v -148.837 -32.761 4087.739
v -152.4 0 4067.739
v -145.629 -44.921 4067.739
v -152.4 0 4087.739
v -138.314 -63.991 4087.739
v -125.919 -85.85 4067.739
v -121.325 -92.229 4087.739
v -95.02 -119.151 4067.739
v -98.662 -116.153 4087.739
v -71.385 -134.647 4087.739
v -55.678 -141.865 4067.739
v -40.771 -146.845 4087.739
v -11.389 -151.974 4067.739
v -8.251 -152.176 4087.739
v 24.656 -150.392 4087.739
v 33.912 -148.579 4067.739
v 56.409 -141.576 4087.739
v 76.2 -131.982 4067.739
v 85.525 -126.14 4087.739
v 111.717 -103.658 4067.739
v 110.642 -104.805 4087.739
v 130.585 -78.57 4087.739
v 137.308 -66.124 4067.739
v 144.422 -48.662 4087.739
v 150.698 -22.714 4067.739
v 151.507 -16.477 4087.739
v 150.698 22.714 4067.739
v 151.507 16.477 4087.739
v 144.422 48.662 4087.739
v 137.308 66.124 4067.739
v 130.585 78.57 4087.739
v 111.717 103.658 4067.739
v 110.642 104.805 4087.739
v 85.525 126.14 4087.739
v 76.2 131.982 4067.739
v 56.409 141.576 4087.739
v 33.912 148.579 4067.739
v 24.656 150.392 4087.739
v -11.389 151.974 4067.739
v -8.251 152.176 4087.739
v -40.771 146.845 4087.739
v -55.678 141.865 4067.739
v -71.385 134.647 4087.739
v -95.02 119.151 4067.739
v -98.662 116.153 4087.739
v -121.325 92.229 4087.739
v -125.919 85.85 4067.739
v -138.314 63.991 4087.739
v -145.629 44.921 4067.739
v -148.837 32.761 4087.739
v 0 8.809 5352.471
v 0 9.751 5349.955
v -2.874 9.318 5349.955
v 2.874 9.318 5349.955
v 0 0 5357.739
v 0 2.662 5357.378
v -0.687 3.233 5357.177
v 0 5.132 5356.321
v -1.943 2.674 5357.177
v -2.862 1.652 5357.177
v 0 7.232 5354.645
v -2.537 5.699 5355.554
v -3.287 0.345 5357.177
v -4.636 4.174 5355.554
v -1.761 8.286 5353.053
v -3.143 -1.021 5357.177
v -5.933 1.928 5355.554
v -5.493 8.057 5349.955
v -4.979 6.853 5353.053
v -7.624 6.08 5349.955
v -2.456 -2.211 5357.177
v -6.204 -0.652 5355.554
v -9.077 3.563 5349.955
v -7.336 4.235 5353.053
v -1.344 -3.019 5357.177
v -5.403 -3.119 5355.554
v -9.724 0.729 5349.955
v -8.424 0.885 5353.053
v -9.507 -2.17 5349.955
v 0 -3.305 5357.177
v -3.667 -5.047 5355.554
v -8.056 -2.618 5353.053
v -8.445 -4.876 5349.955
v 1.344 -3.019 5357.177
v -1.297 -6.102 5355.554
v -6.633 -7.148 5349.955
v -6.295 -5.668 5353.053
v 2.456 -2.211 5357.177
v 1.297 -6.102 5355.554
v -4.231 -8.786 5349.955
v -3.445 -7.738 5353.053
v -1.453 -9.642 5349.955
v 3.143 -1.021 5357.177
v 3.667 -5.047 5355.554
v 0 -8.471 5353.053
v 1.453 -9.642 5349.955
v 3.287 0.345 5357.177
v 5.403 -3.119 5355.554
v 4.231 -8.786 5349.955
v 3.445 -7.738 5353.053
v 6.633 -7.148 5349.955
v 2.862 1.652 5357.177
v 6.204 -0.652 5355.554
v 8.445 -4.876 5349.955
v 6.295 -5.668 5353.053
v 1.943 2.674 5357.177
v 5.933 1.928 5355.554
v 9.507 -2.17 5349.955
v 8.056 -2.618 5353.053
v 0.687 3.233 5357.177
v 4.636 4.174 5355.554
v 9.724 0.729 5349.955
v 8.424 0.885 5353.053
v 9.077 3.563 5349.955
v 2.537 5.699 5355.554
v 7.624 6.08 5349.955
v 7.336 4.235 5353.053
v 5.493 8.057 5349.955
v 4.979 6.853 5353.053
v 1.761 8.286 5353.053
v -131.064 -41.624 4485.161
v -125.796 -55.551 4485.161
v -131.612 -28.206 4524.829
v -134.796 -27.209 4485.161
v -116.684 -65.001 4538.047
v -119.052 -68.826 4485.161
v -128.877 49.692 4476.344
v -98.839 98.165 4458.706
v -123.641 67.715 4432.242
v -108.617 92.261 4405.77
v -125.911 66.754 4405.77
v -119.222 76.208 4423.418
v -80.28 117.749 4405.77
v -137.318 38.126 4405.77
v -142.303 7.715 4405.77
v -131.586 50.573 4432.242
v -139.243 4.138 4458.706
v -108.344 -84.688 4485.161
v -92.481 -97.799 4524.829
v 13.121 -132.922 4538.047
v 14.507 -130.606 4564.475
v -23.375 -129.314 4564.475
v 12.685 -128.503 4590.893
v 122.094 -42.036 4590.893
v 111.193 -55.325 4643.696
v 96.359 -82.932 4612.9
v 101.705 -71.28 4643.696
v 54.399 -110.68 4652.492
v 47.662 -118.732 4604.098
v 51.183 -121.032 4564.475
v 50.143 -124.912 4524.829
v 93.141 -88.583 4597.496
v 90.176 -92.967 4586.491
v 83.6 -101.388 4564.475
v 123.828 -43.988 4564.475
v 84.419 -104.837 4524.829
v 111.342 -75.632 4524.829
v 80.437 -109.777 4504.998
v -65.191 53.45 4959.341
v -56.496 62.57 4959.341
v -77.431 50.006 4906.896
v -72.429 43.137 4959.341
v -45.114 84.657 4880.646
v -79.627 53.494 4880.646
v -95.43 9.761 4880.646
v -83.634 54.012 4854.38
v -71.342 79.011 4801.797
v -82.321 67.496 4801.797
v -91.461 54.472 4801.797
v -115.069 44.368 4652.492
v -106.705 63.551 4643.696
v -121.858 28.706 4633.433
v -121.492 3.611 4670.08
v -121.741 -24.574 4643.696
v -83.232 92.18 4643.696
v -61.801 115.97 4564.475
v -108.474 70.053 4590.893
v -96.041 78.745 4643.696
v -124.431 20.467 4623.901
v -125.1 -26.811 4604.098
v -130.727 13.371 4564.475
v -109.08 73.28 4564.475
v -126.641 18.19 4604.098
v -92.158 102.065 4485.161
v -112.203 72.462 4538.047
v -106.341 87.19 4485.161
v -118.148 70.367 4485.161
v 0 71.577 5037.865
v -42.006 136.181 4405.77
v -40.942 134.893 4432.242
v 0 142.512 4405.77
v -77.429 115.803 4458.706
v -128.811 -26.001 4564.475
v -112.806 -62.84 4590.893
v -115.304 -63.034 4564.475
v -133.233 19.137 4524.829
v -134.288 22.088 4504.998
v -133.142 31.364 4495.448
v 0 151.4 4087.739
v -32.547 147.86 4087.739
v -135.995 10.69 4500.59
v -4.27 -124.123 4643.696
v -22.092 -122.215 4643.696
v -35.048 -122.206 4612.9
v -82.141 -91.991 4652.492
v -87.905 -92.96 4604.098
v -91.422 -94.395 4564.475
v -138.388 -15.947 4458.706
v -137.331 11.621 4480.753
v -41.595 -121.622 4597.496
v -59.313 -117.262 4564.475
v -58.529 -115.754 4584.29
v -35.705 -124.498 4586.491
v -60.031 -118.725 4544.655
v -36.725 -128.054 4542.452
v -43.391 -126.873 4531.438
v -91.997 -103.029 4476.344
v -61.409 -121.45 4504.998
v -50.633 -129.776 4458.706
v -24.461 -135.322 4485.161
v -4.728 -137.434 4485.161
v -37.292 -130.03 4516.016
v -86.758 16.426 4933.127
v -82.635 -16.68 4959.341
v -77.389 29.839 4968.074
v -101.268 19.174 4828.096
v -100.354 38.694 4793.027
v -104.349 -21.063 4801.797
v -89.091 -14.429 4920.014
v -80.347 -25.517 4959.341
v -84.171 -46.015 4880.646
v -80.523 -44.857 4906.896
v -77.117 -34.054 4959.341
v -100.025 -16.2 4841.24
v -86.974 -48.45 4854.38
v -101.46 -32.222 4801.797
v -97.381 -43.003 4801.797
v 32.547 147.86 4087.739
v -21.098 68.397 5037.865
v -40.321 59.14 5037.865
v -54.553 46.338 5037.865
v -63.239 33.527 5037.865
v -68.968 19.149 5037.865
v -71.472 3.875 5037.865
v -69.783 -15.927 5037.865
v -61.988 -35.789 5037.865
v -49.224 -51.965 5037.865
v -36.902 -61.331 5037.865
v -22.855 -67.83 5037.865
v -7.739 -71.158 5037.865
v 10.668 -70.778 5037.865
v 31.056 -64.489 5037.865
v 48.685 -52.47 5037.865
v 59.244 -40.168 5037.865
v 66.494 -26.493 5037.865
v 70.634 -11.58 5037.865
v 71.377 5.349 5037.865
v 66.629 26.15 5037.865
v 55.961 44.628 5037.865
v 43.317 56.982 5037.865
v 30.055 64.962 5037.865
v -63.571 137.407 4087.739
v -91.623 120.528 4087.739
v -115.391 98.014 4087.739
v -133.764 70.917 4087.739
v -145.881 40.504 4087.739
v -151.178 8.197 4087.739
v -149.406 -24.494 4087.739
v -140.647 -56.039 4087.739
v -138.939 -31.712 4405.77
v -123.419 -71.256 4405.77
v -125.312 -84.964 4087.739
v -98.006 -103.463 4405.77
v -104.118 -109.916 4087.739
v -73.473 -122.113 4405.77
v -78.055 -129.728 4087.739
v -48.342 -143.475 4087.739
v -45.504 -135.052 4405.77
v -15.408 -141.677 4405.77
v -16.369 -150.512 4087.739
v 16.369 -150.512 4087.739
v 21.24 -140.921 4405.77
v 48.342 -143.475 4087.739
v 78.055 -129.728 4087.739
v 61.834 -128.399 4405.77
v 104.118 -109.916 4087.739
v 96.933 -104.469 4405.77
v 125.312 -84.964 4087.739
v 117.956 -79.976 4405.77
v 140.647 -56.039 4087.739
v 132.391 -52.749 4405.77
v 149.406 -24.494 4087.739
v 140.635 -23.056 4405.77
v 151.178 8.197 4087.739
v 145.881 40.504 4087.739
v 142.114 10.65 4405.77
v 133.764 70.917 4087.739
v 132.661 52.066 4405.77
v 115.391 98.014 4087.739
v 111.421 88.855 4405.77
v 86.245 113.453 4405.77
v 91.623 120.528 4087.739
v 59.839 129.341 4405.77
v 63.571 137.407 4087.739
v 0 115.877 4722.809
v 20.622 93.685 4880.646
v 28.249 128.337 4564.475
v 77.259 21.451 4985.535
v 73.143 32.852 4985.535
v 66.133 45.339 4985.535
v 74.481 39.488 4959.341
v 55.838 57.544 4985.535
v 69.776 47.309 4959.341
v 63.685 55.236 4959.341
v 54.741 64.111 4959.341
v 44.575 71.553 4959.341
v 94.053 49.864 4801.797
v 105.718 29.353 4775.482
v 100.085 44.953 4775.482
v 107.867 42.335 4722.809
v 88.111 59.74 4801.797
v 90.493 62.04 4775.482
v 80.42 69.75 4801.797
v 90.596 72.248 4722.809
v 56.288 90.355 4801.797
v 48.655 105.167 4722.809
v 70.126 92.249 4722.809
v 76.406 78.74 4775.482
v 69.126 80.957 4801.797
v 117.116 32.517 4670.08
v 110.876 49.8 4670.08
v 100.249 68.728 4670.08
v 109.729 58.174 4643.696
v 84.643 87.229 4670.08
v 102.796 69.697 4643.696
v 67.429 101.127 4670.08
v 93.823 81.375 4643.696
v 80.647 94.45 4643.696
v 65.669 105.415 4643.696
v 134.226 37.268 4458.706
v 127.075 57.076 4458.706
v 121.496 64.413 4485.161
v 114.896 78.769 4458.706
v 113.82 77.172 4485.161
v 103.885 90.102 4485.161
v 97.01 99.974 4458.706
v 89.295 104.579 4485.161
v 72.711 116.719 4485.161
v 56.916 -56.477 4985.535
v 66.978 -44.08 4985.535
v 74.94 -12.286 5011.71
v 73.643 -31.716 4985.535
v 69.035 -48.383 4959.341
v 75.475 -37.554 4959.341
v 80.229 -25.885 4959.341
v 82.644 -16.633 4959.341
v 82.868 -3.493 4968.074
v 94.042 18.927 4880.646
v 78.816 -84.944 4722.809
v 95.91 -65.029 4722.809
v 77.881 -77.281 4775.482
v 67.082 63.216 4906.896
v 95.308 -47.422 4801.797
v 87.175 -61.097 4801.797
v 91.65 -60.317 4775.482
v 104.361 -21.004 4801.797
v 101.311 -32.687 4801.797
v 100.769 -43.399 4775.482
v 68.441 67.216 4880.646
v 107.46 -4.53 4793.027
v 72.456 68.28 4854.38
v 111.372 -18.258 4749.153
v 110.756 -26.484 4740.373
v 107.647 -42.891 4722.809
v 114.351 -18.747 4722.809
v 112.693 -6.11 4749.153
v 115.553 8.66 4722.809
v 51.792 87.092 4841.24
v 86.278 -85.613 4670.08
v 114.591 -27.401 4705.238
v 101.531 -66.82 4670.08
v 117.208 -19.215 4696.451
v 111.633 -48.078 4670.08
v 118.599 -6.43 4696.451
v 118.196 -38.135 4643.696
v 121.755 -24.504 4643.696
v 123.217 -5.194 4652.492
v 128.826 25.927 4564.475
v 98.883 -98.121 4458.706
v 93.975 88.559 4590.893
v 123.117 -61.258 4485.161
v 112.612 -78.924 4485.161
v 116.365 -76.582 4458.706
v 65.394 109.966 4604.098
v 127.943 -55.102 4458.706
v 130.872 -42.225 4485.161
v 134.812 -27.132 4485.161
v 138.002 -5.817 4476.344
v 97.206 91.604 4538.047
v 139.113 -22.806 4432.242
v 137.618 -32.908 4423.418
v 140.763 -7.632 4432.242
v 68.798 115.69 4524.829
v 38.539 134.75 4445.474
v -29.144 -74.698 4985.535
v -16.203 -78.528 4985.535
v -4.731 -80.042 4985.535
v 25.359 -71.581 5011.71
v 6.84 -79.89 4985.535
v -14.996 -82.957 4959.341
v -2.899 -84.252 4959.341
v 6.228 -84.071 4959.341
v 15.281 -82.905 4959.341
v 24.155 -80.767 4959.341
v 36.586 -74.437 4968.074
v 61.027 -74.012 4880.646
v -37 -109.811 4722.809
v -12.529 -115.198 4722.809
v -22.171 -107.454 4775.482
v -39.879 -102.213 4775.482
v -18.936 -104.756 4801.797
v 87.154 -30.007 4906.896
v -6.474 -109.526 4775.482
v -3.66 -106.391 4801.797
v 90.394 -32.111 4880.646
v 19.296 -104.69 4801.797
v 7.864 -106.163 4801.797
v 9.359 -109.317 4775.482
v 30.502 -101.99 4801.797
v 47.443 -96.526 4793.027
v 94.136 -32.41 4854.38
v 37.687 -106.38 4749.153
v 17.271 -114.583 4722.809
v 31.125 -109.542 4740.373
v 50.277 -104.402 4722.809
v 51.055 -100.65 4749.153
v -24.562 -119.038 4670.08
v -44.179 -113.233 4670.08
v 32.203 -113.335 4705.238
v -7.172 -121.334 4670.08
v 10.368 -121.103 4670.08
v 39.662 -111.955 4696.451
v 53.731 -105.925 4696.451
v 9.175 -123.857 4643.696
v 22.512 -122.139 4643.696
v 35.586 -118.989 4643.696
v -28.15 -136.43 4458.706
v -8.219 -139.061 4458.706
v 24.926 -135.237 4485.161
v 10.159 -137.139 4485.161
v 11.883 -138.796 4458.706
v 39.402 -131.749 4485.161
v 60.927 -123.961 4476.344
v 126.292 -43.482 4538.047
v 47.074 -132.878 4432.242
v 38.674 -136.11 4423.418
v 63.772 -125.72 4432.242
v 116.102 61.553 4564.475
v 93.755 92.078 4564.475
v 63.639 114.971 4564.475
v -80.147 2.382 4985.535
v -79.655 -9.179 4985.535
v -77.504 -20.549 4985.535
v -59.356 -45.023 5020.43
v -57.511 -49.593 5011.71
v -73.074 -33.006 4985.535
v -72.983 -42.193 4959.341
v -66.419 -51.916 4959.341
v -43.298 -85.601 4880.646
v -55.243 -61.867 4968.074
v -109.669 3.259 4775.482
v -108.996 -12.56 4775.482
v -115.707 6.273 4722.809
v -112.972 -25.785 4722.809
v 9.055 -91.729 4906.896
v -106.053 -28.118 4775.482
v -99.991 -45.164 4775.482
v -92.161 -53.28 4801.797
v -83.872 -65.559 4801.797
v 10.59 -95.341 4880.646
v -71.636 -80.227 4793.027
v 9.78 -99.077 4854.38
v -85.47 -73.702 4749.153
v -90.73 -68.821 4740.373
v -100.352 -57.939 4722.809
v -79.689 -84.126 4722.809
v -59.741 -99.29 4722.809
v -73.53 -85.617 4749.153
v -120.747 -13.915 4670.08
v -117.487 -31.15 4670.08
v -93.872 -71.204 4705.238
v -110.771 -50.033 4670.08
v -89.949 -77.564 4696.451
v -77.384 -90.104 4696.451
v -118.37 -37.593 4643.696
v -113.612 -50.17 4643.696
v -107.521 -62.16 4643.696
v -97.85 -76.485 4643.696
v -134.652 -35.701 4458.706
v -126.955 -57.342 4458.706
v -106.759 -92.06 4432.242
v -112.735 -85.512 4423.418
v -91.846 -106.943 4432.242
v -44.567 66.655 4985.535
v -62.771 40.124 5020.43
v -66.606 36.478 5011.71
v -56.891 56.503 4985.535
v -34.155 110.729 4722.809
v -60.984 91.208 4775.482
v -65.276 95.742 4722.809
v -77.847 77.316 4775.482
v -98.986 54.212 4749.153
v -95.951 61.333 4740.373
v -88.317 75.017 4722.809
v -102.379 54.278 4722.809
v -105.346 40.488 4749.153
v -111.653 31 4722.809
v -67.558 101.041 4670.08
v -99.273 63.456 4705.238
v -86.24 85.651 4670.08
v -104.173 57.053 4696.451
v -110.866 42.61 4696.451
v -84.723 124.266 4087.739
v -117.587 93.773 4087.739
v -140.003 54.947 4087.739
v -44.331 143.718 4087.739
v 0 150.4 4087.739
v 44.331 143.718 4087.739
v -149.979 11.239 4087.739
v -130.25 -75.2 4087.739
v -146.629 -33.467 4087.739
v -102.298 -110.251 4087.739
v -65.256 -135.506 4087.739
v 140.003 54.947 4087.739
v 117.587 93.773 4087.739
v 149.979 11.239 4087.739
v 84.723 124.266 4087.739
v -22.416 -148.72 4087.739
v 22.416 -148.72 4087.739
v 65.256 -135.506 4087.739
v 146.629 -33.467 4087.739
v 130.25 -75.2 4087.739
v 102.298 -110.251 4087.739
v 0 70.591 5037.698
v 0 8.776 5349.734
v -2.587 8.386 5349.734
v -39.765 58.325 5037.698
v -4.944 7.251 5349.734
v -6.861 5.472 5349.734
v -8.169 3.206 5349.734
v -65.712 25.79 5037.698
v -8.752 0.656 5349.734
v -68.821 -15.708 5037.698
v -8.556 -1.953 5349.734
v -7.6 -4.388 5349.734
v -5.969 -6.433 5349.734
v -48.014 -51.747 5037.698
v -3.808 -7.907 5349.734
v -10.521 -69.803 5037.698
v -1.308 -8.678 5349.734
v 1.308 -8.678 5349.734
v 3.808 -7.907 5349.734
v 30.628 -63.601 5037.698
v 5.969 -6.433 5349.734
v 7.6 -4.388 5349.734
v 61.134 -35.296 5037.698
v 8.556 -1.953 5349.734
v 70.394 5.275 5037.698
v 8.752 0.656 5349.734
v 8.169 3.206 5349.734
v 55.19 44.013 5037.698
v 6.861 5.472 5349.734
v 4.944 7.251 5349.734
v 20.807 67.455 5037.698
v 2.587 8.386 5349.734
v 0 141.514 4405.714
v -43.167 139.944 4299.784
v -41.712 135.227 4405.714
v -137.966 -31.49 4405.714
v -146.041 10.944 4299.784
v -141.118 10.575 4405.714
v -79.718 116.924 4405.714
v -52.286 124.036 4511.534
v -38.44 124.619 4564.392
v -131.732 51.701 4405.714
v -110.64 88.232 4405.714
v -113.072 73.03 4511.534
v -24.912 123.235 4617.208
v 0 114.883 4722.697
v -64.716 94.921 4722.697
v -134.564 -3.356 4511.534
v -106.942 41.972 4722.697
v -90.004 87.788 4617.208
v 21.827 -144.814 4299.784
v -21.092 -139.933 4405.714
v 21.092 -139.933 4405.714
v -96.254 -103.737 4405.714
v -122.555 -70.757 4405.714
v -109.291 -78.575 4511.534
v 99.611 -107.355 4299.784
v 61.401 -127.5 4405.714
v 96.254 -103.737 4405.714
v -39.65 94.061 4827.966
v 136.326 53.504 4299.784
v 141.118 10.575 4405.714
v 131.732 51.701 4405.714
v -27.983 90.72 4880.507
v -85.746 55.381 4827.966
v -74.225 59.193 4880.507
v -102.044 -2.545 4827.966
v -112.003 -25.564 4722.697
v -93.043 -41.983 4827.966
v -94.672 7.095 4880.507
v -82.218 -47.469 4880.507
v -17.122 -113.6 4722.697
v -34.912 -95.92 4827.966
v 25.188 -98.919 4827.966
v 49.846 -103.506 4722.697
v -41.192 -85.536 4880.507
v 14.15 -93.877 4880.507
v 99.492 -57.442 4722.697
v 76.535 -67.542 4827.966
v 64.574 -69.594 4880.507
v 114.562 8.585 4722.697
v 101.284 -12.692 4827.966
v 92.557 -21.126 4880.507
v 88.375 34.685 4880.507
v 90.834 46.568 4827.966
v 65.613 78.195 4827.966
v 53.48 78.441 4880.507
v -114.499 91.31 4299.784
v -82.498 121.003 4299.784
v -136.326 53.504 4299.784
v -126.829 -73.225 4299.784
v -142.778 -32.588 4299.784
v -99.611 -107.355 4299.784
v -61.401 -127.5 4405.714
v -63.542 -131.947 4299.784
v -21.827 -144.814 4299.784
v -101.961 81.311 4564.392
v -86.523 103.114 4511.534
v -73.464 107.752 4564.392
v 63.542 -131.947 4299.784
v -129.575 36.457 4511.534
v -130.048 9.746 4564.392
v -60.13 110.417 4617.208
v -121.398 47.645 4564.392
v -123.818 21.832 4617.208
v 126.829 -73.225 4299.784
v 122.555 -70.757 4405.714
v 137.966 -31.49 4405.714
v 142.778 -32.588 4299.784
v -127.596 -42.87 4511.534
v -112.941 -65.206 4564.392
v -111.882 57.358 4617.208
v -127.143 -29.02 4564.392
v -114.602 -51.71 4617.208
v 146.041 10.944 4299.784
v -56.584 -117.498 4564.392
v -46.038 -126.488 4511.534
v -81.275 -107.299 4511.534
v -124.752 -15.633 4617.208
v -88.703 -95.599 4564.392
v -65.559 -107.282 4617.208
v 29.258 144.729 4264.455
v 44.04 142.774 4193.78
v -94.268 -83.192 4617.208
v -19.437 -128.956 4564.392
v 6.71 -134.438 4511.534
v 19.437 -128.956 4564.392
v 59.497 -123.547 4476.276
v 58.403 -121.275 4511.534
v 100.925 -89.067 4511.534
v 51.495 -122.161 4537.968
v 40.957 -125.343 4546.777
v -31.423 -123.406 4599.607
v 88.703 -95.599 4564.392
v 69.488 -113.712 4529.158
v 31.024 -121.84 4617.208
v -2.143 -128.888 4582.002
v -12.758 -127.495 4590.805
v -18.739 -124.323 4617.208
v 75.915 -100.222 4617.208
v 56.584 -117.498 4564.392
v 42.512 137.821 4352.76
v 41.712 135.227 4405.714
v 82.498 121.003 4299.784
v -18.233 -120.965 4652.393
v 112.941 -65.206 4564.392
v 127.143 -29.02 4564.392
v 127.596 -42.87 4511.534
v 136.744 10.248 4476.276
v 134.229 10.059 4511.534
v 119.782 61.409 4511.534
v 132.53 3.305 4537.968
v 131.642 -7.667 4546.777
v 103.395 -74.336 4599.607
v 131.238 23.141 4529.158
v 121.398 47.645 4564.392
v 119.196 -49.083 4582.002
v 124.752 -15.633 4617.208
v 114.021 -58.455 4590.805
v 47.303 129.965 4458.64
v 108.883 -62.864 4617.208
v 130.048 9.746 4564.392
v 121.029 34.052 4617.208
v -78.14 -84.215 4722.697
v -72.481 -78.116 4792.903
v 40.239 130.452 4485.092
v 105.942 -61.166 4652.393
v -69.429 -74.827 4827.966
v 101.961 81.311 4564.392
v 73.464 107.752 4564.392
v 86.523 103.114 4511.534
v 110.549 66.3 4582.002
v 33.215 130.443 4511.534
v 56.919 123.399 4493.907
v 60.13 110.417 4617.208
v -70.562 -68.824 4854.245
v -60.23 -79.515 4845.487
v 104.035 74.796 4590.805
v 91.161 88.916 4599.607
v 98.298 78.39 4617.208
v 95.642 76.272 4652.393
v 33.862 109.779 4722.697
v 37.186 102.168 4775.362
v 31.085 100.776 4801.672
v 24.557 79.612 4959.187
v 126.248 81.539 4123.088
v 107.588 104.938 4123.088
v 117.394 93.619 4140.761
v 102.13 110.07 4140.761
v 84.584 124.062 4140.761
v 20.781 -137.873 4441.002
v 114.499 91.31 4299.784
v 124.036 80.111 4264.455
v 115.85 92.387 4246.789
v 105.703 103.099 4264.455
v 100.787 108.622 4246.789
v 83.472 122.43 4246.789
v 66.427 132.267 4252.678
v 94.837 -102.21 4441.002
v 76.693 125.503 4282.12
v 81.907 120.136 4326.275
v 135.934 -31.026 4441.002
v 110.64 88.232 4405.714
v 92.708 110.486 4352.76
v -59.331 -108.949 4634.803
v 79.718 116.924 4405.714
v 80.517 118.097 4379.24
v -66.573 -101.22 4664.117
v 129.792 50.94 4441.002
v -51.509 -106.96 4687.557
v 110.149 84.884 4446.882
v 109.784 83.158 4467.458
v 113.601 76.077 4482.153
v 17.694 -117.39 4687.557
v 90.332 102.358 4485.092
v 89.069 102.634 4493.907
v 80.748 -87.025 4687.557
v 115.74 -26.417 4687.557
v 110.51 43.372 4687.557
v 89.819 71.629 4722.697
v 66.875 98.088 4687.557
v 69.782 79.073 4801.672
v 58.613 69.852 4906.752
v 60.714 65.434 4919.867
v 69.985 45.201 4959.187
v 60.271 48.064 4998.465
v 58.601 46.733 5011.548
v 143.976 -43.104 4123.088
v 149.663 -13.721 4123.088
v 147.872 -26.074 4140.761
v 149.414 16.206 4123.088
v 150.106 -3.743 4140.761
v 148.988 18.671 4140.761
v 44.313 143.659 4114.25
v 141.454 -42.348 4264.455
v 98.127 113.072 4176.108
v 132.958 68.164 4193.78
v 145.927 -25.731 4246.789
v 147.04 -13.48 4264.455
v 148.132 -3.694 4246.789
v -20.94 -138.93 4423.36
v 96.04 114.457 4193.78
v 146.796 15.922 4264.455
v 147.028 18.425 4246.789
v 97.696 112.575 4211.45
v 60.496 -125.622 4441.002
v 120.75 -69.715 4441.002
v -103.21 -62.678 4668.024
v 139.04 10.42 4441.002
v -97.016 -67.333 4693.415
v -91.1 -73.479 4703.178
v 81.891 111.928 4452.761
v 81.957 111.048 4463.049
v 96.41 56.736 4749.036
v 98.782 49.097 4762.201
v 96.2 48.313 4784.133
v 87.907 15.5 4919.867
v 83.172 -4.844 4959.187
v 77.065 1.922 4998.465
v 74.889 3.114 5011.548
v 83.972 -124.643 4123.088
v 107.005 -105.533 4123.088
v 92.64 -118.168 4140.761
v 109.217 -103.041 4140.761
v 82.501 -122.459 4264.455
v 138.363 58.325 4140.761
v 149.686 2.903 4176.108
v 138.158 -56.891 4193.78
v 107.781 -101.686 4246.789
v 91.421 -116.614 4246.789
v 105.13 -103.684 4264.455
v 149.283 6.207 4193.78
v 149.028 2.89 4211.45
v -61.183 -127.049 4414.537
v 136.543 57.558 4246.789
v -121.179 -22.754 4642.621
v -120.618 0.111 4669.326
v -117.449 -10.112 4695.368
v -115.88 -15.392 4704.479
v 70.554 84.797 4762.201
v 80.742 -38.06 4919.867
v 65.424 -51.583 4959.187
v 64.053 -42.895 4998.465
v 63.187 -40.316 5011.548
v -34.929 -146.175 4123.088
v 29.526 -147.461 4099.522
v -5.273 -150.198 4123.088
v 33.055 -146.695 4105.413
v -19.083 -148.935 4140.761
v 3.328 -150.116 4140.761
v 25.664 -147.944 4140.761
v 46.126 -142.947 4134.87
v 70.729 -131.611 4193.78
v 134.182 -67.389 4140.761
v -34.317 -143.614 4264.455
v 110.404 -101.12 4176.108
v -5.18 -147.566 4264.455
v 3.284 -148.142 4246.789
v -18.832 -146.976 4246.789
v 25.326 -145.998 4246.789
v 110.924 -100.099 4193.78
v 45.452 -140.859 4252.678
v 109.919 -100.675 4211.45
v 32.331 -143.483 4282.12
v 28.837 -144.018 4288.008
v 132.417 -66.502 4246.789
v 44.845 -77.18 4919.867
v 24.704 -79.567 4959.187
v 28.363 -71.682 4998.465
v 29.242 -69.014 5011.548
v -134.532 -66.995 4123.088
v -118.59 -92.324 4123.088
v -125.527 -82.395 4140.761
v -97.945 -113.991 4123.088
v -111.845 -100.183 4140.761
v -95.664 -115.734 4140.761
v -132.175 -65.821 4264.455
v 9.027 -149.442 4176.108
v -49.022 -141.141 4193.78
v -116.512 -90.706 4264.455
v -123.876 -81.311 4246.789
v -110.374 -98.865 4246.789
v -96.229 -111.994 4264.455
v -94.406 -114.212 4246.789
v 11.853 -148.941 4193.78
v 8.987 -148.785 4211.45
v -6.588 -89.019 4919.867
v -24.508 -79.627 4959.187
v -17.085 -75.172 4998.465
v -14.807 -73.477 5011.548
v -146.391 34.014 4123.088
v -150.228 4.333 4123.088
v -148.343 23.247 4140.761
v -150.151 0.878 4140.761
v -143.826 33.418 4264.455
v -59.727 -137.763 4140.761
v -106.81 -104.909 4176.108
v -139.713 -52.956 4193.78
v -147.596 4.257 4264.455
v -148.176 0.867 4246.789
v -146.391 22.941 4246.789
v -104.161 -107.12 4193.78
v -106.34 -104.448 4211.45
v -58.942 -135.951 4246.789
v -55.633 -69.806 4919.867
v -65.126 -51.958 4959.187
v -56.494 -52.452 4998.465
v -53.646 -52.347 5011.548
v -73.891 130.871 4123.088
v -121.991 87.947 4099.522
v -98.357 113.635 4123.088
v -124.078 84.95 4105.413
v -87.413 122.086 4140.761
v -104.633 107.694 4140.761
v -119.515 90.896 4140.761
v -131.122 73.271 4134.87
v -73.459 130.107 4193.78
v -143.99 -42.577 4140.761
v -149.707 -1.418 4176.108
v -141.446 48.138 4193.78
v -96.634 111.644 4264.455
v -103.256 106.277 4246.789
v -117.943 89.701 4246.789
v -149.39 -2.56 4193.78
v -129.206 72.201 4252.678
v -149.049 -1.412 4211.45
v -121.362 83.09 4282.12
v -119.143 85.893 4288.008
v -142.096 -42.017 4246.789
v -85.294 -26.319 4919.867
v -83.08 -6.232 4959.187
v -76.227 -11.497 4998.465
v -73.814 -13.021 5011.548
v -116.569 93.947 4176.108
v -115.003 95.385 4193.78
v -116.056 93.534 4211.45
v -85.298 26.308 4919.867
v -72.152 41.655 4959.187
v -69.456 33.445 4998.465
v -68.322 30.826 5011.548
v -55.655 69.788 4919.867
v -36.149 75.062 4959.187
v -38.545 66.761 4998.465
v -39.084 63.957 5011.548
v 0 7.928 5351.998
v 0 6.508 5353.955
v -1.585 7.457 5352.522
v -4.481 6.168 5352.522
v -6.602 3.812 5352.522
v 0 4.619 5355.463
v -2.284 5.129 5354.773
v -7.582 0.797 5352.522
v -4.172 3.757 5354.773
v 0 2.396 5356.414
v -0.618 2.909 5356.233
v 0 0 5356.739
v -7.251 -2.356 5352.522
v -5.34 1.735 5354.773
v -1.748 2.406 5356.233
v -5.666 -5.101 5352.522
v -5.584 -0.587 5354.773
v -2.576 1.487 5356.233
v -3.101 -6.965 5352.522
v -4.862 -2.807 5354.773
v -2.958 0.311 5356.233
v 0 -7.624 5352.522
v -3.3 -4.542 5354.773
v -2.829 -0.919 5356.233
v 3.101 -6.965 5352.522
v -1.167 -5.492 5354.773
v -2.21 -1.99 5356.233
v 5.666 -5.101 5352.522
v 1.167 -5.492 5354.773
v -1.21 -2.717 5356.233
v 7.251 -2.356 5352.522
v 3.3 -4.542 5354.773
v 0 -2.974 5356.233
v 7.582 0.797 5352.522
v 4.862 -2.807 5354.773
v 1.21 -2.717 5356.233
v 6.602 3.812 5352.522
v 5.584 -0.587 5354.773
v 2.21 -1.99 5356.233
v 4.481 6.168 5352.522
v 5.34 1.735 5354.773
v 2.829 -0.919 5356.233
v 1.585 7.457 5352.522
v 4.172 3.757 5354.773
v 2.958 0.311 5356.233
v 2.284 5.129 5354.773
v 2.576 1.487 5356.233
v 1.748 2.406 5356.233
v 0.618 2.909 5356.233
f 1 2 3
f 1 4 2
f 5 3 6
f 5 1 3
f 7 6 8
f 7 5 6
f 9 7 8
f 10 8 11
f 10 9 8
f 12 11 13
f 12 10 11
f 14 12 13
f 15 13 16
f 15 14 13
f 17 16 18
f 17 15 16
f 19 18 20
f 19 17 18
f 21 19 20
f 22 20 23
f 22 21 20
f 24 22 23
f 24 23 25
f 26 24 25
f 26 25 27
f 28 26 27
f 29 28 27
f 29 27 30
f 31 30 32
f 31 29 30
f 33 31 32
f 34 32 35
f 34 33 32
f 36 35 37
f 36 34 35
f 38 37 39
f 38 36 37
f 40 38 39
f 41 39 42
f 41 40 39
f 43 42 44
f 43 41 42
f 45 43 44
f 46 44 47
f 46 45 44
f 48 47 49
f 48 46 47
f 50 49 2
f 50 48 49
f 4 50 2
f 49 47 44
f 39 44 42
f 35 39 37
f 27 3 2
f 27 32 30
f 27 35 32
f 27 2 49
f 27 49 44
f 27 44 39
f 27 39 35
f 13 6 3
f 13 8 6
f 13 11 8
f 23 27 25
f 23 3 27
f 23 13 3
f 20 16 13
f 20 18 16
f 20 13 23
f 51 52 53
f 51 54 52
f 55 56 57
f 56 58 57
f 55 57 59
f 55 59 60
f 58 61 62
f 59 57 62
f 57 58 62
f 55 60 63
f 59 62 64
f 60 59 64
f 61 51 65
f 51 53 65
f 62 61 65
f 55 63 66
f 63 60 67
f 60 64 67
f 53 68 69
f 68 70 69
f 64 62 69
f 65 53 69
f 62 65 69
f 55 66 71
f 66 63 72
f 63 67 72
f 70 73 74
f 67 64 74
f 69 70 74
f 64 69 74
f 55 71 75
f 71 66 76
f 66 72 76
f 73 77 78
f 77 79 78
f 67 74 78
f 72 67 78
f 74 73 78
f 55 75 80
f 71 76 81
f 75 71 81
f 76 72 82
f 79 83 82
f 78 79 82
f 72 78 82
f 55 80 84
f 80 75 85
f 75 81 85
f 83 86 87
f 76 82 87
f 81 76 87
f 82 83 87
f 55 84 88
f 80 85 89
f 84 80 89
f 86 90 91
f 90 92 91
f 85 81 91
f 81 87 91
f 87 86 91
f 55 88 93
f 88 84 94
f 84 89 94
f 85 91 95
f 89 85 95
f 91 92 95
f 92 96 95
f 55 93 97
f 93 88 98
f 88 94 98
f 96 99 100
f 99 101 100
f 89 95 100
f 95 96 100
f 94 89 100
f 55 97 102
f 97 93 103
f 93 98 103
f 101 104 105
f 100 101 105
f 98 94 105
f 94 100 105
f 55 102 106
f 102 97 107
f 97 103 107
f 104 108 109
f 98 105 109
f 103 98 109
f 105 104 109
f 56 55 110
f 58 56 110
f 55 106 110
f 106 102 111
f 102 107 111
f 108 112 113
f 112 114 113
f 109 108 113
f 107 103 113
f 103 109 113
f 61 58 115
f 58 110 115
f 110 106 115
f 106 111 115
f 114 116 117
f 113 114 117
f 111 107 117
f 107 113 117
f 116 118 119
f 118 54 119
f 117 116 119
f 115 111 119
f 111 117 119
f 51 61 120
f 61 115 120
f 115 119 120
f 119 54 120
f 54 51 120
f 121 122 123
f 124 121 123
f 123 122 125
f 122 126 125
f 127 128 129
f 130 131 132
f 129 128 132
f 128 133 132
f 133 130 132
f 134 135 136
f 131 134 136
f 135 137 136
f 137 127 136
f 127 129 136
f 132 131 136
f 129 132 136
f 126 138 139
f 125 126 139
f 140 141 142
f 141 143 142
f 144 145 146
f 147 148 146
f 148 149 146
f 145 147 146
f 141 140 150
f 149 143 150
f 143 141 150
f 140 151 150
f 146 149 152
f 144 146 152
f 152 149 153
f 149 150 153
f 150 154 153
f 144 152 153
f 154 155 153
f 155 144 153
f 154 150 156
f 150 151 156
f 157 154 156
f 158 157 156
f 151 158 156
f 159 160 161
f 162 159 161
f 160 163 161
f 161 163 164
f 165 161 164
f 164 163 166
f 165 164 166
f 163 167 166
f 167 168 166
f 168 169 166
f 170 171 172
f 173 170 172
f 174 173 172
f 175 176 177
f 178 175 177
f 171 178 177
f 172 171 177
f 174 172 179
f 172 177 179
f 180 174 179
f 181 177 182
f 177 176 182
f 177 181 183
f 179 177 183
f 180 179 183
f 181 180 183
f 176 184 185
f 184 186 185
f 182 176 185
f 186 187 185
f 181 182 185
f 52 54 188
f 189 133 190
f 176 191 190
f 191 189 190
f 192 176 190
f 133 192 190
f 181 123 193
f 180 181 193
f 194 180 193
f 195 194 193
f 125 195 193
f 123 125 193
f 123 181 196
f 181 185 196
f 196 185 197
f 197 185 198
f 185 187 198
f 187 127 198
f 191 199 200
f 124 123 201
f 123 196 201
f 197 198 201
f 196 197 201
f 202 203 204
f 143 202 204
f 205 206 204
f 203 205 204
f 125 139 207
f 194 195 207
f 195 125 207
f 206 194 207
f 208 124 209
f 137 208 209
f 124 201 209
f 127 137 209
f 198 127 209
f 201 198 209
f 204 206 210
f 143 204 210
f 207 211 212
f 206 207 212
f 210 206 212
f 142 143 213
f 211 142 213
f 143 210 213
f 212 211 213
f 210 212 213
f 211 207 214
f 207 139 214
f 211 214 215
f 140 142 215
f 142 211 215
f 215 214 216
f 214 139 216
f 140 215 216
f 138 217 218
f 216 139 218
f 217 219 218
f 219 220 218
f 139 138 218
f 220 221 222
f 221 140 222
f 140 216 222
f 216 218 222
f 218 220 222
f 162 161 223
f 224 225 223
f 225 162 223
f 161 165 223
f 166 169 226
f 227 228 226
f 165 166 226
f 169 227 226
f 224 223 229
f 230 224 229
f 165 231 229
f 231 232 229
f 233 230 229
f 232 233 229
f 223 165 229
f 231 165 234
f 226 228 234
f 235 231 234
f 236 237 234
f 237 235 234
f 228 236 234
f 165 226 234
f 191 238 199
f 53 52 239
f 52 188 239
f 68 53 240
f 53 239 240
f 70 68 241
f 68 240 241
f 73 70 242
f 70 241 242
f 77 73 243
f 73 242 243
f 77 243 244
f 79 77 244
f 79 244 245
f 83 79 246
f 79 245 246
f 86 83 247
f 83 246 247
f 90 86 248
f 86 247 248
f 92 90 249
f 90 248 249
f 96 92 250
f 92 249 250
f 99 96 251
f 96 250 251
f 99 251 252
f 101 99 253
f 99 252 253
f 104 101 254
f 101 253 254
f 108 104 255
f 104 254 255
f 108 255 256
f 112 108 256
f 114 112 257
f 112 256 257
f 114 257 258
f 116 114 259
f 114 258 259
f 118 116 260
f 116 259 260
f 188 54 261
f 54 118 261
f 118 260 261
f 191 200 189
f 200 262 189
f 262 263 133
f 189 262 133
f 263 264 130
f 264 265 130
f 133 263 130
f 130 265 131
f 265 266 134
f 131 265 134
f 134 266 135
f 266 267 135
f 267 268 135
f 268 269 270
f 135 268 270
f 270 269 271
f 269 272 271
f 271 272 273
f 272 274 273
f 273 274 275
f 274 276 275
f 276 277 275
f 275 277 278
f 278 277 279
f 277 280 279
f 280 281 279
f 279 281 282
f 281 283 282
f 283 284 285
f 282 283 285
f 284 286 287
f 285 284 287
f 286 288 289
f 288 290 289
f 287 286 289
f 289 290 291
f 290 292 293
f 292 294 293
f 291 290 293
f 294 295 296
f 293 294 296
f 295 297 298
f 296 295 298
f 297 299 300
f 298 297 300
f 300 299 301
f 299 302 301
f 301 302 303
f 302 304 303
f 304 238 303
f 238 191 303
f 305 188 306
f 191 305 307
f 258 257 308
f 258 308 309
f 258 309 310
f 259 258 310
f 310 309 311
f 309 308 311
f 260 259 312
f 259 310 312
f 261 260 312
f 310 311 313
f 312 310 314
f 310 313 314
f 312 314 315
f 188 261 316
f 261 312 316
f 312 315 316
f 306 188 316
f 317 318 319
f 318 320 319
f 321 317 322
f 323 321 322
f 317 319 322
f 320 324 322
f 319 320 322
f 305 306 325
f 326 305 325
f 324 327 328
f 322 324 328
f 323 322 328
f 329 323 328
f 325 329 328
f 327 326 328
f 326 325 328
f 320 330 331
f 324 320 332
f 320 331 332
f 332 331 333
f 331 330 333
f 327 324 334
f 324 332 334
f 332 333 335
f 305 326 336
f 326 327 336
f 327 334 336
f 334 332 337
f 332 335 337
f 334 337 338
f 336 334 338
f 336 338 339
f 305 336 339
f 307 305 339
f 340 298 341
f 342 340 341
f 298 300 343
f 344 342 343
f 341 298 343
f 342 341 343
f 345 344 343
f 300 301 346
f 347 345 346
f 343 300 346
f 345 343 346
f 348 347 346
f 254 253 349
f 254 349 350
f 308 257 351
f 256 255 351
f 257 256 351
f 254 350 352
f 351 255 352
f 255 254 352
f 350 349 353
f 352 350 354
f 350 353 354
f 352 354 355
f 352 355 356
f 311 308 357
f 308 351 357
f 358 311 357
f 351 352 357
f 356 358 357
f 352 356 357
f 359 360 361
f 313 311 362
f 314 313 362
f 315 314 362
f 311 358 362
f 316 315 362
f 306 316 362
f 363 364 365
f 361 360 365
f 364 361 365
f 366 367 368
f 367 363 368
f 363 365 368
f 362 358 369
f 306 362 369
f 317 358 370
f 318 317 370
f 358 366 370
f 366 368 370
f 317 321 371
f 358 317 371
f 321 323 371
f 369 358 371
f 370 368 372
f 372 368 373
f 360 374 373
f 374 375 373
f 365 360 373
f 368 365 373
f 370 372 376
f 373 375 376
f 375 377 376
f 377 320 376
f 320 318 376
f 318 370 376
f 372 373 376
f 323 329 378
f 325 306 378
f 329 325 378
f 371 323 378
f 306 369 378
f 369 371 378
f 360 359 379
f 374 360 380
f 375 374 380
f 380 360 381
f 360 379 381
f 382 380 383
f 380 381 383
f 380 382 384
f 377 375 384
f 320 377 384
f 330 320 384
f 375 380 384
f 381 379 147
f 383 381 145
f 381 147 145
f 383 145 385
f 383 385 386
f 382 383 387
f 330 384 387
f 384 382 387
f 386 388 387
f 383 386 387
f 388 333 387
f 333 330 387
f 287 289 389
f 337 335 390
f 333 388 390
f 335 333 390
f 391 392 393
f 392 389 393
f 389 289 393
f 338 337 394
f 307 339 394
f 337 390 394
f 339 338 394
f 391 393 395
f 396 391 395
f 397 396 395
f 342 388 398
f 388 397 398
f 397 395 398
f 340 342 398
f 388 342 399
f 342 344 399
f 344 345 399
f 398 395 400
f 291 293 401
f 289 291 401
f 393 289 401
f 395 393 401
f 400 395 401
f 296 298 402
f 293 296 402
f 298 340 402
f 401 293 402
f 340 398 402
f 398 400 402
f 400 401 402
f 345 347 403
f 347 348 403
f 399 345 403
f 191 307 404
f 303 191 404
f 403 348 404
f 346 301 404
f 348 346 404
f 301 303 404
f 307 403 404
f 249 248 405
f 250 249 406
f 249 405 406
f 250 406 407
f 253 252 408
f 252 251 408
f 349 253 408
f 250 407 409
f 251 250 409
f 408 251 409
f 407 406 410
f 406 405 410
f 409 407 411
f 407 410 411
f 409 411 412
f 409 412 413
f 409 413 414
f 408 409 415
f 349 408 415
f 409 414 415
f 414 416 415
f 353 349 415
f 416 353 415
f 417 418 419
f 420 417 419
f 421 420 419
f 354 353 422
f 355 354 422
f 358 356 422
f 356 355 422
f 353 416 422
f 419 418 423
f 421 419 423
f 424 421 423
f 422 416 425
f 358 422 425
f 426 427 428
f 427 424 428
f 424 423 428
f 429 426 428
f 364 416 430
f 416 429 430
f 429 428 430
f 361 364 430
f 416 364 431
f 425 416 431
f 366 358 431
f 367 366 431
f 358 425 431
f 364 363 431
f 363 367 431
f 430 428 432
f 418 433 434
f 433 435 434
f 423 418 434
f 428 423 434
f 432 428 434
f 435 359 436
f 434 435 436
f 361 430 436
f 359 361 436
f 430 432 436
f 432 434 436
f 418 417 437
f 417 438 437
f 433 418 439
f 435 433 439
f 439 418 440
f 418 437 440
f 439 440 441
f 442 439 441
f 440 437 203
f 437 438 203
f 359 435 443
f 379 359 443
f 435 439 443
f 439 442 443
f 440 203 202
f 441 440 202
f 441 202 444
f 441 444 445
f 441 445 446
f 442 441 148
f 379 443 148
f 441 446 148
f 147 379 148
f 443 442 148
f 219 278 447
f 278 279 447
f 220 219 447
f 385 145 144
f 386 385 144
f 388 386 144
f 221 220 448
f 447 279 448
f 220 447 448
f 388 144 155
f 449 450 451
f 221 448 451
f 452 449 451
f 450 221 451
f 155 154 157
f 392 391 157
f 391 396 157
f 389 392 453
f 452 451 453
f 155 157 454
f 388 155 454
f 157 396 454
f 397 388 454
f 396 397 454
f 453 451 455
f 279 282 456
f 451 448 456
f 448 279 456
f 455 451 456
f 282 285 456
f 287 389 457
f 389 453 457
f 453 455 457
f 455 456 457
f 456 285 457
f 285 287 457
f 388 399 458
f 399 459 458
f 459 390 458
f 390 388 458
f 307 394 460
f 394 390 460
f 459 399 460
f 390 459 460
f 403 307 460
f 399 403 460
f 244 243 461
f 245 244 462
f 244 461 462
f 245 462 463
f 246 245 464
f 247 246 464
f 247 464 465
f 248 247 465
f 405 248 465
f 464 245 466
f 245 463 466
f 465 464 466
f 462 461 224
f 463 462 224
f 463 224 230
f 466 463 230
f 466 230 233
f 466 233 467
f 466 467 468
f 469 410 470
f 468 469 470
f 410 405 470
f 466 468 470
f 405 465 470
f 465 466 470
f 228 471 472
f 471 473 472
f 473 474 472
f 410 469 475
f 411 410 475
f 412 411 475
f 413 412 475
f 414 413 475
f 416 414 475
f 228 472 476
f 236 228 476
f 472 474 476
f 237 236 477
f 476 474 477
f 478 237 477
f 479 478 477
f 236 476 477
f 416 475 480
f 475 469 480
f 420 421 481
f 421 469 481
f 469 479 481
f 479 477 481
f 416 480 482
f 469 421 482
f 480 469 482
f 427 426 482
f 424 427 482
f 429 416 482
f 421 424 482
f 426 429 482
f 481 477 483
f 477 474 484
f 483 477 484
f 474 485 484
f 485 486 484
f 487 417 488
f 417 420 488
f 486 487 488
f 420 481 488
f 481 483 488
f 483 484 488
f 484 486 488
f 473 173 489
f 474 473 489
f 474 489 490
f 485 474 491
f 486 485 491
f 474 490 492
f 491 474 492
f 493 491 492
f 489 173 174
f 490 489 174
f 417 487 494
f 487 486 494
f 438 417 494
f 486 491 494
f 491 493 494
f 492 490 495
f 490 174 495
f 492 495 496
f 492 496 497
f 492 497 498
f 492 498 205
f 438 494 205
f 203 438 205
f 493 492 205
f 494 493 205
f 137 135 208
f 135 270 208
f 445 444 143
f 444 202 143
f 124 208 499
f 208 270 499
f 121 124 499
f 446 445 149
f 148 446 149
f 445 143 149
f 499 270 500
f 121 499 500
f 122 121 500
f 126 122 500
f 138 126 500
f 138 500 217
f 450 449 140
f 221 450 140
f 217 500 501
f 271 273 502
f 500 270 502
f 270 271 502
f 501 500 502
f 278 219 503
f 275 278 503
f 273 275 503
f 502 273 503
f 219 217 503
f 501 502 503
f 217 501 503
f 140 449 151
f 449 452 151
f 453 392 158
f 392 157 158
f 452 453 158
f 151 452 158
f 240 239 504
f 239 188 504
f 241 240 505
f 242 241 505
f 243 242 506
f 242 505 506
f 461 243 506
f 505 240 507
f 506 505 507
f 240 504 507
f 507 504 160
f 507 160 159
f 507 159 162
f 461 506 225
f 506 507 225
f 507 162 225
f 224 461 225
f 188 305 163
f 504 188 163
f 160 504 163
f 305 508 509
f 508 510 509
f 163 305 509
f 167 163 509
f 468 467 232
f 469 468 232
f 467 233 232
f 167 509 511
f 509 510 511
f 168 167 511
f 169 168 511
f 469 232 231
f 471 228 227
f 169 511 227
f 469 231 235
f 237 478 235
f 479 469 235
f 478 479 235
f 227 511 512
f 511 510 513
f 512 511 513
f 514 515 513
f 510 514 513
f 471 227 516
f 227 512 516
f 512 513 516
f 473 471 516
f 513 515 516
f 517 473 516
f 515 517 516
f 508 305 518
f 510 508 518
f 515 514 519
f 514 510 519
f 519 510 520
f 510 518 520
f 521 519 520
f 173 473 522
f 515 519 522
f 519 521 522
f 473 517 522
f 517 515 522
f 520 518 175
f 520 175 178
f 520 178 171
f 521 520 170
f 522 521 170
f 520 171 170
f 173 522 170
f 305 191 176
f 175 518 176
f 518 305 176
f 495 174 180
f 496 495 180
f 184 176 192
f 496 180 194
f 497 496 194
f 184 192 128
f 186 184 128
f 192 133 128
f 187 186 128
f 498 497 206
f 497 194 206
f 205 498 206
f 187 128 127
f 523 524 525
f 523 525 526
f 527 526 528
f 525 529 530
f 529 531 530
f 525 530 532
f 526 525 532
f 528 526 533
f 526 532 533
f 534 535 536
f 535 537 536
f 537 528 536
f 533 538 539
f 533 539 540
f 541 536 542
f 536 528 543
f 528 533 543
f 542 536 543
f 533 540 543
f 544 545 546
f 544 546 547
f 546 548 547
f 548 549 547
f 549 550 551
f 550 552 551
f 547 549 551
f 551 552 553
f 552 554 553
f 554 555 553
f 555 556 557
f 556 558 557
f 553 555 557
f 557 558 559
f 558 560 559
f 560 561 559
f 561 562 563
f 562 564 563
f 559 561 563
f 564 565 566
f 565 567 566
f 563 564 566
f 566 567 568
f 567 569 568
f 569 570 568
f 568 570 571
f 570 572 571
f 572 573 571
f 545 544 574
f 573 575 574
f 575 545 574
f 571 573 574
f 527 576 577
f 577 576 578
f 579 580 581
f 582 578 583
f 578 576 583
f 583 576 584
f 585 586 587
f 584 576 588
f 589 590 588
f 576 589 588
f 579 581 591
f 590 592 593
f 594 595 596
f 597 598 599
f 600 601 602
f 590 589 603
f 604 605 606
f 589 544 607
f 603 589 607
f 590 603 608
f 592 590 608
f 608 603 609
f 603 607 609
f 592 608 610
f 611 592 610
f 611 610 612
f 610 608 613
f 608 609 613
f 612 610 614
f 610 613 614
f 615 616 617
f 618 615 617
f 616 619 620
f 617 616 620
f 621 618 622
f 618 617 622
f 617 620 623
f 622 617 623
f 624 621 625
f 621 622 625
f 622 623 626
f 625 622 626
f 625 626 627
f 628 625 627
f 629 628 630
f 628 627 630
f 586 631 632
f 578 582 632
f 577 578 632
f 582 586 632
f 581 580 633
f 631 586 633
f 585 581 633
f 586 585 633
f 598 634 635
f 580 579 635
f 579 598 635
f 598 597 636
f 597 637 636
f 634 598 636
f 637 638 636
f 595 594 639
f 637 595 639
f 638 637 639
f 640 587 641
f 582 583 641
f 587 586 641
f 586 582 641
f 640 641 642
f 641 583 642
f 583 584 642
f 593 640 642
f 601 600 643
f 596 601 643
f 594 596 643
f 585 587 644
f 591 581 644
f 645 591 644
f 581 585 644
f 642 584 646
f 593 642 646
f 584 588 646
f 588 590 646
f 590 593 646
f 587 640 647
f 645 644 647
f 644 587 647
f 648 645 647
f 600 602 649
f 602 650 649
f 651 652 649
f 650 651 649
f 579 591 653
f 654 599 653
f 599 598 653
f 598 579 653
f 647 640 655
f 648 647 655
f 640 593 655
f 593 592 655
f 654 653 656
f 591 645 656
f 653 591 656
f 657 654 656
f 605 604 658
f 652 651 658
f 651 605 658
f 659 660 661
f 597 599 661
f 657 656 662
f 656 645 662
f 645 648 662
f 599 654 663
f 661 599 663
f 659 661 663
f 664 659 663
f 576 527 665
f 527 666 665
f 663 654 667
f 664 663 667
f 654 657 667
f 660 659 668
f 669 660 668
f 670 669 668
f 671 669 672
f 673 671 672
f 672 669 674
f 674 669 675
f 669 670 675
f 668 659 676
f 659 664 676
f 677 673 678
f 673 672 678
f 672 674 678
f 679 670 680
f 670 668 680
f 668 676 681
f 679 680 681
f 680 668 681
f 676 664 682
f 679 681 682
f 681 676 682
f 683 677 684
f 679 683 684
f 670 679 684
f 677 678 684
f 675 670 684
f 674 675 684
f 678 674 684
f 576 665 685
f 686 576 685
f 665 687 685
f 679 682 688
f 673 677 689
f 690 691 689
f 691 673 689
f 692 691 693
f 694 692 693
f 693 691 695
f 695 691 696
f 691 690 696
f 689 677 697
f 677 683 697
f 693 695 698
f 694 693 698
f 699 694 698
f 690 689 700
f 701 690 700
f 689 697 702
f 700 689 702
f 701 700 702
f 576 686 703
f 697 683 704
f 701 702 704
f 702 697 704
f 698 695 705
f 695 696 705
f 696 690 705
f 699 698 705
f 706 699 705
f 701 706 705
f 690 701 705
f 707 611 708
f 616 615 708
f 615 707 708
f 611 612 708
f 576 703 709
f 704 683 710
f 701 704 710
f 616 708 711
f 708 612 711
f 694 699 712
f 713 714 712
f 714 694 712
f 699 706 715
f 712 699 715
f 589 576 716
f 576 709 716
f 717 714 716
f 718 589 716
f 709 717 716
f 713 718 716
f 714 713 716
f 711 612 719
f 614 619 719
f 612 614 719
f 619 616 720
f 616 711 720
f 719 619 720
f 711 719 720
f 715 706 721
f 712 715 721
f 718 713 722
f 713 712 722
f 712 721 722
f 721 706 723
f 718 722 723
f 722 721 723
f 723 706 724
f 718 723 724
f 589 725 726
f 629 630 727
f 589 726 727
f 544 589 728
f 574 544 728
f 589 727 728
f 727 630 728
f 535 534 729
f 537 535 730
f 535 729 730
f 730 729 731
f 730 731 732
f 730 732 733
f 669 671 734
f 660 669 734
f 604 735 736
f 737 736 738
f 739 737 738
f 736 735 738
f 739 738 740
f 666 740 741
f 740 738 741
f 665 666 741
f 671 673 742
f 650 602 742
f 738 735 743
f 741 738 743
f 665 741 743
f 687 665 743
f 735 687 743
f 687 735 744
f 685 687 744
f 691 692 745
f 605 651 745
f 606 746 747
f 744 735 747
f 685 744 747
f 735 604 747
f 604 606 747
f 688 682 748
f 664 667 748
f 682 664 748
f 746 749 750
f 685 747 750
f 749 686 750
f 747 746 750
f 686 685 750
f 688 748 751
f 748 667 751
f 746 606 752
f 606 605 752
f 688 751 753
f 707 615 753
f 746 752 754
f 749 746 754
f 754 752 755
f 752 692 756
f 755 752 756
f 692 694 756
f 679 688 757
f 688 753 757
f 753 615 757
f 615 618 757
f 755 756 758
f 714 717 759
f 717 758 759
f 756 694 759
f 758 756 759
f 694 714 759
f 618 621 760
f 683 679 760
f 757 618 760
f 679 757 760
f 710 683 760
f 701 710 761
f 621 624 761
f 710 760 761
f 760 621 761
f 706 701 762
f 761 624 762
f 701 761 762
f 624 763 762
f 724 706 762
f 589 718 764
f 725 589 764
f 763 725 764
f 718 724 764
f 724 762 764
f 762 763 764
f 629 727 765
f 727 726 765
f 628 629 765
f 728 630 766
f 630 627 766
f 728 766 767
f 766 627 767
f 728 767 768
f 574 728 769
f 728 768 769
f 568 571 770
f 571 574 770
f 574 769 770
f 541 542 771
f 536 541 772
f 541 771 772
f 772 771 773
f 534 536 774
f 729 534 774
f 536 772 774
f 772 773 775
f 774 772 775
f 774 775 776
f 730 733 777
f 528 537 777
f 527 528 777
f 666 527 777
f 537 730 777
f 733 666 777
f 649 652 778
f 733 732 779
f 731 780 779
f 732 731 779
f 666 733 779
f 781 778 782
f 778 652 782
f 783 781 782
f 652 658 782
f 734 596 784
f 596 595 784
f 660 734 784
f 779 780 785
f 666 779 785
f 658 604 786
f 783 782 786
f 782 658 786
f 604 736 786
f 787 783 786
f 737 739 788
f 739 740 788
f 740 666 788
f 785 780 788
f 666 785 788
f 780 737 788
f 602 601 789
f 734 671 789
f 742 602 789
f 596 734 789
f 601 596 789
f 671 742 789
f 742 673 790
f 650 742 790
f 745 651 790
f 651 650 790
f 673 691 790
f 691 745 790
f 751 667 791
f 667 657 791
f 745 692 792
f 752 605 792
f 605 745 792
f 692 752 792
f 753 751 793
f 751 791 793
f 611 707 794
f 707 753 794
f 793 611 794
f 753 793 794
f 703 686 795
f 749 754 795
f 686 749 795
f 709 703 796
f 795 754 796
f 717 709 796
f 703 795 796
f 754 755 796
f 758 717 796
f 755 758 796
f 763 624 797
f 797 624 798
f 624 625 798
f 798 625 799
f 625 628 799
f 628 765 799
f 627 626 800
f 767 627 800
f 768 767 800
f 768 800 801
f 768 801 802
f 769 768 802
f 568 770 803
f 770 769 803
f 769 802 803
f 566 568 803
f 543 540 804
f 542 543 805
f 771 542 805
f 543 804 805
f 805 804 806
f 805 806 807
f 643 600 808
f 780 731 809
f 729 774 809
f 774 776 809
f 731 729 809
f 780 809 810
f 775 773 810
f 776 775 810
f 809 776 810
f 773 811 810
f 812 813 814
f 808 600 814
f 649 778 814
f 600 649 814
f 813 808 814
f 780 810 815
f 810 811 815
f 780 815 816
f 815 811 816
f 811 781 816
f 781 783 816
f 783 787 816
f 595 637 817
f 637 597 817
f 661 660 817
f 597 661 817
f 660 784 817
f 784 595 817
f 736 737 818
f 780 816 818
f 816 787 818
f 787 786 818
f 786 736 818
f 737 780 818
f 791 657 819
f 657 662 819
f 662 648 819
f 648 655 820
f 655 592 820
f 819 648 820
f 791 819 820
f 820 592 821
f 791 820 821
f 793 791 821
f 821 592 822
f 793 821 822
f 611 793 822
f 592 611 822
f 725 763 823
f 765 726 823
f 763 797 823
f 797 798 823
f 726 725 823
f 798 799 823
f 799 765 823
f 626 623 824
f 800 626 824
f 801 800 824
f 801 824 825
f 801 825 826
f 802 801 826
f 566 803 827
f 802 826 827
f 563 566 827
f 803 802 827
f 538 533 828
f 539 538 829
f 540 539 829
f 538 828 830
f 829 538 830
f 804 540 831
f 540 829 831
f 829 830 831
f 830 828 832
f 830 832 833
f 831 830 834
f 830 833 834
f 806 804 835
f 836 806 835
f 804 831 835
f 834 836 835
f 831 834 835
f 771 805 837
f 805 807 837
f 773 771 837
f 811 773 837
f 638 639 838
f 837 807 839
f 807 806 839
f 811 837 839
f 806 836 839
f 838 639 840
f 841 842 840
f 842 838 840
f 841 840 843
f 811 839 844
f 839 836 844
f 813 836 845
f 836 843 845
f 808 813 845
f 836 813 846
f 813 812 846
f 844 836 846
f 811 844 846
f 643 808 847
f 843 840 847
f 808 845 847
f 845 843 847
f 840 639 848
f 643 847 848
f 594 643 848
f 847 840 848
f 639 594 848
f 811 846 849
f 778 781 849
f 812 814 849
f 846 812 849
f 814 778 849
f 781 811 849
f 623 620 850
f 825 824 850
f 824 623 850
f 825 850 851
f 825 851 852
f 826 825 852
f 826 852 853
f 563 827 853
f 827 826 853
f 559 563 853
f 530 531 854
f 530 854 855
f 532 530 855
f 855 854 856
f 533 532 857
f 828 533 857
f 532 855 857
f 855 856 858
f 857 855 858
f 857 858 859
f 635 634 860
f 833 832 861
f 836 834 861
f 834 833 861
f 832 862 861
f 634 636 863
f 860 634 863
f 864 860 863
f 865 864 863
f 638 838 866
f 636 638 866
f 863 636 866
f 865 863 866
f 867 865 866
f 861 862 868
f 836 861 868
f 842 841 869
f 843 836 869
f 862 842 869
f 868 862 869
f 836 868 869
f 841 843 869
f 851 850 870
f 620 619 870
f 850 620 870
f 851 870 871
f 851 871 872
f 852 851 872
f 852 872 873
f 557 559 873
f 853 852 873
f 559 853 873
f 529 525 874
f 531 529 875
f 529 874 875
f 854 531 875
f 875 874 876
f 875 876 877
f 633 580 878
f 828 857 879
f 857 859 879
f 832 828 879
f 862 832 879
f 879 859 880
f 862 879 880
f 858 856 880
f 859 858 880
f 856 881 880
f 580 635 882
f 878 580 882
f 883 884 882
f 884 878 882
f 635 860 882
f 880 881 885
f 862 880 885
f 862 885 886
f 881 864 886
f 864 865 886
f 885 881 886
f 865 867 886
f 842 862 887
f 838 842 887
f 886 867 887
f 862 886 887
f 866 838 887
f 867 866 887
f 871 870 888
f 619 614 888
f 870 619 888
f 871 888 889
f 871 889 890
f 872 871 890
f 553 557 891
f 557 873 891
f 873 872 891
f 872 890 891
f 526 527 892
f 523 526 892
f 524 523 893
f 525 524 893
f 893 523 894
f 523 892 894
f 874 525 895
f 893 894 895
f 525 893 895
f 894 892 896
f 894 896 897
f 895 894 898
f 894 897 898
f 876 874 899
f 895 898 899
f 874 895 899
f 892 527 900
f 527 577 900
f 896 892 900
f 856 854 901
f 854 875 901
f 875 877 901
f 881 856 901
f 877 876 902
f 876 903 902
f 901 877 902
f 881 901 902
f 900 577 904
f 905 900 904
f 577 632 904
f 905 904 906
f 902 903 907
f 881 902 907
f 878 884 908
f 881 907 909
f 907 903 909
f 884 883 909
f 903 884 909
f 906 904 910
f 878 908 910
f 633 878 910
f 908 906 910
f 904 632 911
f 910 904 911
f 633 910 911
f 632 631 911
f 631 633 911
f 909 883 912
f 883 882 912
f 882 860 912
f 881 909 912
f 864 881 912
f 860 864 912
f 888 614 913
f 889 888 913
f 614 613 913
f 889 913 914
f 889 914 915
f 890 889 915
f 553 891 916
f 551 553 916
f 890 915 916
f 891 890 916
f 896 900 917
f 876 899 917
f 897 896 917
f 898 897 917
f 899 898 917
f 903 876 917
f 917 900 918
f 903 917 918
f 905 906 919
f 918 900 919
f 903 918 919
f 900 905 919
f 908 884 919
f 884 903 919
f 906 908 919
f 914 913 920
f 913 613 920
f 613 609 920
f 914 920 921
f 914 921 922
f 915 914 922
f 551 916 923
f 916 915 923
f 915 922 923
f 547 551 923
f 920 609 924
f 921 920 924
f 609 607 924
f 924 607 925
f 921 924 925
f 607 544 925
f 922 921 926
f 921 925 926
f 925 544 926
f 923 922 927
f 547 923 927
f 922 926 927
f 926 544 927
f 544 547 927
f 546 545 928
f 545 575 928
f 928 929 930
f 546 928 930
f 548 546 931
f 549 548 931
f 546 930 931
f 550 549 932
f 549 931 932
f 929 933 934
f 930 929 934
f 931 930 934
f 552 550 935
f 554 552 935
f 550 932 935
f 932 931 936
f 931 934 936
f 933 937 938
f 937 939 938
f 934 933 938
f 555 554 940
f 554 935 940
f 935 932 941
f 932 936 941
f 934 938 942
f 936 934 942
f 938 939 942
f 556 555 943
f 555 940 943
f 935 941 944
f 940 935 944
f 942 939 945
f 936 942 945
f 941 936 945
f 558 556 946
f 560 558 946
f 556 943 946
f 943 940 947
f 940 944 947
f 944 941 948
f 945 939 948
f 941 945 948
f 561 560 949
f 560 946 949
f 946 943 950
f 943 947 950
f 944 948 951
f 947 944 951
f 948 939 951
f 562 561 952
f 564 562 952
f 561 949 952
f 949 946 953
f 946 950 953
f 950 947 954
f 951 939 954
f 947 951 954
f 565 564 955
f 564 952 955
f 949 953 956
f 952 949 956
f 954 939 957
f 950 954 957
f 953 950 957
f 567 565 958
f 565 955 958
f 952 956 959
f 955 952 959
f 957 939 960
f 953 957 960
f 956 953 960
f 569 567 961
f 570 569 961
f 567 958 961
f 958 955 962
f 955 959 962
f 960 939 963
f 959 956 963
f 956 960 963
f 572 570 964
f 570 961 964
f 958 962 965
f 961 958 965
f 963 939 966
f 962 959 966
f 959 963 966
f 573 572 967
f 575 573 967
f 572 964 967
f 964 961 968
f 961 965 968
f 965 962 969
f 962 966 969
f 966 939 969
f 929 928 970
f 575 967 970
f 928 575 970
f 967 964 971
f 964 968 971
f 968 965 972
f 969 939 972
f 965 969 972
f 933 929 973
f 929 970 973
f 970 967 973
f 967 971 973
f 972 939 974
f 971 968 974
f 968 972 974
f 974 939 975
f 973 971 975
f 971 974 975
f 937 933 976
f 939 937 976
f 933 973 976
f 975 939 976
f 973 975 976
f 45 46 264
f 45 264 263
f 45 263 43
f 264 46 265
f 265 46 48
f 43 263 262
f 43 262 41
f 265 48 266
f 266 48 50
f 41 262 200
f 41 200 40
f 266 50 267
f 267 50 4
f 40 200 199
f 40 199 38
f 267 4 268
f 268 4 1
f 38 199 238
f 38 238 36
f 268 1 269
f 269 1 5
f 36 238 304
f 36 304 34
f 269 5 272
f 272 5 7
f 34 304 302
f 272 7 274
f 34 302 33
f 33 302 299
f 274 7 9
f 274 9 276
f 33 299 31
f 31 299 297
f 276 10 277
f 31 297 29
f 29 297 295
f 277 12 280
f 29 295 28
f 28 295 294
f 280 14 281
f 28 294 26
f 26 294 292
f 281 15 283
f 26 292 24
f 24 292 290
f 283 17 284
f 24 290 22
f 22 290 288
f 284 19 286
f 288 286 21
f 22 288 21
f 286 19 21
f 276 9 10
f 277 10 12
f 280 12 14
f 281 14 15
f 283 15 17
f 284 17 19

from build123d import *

# Parameters (mm, degrees)
SKETCH1_14_W = 152.4
SKETCH1_14_H = 20


with BuildPart() as part:
    # Sketch1<14> → Revolve9 (revolve)
    with BuildSketch(Plane.YZ, mode=Mode.PRIVATE) as revolve9_sk:
        with Locations((76.2, 4077.73873053)):
            Rectangle(SKETCH1_14_W, SKETCH1_14_H)
    revolve(revolve9_sk.sketch.rotate(Axis((0, 0, 4067.73873053), (0, 0, 1)), 90), axis=Axis((0, 0, 4067.73873053), (0, 0, 1)))

    # Sketch1<18> → Revolve-Thin9 (revolve)
    with BuildSketch(Plane.YZ):
        with BuildLine():
            ThreePointArc((0, 5357.73873053), (6.238377253, 5355.554269491), (9.751256095, 5349.955260381))
            ThreePointArc((9.751256095, 5349.955260381), (115.877016875, 4722.808595757), (151.4, 4087.73873053))
            Line((151.4, 4087.73873053), (150.4, 4087.73873053))
            ThreePointArc((150.4, 4087.73873053), (114.883254929, 4722.697073583), (8.776130485, 5349.733607396))
            ThreePointArc((8.776130485, 5349.733607396), (5.614539527, 5354.772715595), (0, 5356.73873053))
            Line((0, 5356.73873053), (0, 5357.73873053))
        make_face()
    revolve(axis=Axis((0, 0, 2579.7350764), (0, 0, 1)))


solid = part.part
